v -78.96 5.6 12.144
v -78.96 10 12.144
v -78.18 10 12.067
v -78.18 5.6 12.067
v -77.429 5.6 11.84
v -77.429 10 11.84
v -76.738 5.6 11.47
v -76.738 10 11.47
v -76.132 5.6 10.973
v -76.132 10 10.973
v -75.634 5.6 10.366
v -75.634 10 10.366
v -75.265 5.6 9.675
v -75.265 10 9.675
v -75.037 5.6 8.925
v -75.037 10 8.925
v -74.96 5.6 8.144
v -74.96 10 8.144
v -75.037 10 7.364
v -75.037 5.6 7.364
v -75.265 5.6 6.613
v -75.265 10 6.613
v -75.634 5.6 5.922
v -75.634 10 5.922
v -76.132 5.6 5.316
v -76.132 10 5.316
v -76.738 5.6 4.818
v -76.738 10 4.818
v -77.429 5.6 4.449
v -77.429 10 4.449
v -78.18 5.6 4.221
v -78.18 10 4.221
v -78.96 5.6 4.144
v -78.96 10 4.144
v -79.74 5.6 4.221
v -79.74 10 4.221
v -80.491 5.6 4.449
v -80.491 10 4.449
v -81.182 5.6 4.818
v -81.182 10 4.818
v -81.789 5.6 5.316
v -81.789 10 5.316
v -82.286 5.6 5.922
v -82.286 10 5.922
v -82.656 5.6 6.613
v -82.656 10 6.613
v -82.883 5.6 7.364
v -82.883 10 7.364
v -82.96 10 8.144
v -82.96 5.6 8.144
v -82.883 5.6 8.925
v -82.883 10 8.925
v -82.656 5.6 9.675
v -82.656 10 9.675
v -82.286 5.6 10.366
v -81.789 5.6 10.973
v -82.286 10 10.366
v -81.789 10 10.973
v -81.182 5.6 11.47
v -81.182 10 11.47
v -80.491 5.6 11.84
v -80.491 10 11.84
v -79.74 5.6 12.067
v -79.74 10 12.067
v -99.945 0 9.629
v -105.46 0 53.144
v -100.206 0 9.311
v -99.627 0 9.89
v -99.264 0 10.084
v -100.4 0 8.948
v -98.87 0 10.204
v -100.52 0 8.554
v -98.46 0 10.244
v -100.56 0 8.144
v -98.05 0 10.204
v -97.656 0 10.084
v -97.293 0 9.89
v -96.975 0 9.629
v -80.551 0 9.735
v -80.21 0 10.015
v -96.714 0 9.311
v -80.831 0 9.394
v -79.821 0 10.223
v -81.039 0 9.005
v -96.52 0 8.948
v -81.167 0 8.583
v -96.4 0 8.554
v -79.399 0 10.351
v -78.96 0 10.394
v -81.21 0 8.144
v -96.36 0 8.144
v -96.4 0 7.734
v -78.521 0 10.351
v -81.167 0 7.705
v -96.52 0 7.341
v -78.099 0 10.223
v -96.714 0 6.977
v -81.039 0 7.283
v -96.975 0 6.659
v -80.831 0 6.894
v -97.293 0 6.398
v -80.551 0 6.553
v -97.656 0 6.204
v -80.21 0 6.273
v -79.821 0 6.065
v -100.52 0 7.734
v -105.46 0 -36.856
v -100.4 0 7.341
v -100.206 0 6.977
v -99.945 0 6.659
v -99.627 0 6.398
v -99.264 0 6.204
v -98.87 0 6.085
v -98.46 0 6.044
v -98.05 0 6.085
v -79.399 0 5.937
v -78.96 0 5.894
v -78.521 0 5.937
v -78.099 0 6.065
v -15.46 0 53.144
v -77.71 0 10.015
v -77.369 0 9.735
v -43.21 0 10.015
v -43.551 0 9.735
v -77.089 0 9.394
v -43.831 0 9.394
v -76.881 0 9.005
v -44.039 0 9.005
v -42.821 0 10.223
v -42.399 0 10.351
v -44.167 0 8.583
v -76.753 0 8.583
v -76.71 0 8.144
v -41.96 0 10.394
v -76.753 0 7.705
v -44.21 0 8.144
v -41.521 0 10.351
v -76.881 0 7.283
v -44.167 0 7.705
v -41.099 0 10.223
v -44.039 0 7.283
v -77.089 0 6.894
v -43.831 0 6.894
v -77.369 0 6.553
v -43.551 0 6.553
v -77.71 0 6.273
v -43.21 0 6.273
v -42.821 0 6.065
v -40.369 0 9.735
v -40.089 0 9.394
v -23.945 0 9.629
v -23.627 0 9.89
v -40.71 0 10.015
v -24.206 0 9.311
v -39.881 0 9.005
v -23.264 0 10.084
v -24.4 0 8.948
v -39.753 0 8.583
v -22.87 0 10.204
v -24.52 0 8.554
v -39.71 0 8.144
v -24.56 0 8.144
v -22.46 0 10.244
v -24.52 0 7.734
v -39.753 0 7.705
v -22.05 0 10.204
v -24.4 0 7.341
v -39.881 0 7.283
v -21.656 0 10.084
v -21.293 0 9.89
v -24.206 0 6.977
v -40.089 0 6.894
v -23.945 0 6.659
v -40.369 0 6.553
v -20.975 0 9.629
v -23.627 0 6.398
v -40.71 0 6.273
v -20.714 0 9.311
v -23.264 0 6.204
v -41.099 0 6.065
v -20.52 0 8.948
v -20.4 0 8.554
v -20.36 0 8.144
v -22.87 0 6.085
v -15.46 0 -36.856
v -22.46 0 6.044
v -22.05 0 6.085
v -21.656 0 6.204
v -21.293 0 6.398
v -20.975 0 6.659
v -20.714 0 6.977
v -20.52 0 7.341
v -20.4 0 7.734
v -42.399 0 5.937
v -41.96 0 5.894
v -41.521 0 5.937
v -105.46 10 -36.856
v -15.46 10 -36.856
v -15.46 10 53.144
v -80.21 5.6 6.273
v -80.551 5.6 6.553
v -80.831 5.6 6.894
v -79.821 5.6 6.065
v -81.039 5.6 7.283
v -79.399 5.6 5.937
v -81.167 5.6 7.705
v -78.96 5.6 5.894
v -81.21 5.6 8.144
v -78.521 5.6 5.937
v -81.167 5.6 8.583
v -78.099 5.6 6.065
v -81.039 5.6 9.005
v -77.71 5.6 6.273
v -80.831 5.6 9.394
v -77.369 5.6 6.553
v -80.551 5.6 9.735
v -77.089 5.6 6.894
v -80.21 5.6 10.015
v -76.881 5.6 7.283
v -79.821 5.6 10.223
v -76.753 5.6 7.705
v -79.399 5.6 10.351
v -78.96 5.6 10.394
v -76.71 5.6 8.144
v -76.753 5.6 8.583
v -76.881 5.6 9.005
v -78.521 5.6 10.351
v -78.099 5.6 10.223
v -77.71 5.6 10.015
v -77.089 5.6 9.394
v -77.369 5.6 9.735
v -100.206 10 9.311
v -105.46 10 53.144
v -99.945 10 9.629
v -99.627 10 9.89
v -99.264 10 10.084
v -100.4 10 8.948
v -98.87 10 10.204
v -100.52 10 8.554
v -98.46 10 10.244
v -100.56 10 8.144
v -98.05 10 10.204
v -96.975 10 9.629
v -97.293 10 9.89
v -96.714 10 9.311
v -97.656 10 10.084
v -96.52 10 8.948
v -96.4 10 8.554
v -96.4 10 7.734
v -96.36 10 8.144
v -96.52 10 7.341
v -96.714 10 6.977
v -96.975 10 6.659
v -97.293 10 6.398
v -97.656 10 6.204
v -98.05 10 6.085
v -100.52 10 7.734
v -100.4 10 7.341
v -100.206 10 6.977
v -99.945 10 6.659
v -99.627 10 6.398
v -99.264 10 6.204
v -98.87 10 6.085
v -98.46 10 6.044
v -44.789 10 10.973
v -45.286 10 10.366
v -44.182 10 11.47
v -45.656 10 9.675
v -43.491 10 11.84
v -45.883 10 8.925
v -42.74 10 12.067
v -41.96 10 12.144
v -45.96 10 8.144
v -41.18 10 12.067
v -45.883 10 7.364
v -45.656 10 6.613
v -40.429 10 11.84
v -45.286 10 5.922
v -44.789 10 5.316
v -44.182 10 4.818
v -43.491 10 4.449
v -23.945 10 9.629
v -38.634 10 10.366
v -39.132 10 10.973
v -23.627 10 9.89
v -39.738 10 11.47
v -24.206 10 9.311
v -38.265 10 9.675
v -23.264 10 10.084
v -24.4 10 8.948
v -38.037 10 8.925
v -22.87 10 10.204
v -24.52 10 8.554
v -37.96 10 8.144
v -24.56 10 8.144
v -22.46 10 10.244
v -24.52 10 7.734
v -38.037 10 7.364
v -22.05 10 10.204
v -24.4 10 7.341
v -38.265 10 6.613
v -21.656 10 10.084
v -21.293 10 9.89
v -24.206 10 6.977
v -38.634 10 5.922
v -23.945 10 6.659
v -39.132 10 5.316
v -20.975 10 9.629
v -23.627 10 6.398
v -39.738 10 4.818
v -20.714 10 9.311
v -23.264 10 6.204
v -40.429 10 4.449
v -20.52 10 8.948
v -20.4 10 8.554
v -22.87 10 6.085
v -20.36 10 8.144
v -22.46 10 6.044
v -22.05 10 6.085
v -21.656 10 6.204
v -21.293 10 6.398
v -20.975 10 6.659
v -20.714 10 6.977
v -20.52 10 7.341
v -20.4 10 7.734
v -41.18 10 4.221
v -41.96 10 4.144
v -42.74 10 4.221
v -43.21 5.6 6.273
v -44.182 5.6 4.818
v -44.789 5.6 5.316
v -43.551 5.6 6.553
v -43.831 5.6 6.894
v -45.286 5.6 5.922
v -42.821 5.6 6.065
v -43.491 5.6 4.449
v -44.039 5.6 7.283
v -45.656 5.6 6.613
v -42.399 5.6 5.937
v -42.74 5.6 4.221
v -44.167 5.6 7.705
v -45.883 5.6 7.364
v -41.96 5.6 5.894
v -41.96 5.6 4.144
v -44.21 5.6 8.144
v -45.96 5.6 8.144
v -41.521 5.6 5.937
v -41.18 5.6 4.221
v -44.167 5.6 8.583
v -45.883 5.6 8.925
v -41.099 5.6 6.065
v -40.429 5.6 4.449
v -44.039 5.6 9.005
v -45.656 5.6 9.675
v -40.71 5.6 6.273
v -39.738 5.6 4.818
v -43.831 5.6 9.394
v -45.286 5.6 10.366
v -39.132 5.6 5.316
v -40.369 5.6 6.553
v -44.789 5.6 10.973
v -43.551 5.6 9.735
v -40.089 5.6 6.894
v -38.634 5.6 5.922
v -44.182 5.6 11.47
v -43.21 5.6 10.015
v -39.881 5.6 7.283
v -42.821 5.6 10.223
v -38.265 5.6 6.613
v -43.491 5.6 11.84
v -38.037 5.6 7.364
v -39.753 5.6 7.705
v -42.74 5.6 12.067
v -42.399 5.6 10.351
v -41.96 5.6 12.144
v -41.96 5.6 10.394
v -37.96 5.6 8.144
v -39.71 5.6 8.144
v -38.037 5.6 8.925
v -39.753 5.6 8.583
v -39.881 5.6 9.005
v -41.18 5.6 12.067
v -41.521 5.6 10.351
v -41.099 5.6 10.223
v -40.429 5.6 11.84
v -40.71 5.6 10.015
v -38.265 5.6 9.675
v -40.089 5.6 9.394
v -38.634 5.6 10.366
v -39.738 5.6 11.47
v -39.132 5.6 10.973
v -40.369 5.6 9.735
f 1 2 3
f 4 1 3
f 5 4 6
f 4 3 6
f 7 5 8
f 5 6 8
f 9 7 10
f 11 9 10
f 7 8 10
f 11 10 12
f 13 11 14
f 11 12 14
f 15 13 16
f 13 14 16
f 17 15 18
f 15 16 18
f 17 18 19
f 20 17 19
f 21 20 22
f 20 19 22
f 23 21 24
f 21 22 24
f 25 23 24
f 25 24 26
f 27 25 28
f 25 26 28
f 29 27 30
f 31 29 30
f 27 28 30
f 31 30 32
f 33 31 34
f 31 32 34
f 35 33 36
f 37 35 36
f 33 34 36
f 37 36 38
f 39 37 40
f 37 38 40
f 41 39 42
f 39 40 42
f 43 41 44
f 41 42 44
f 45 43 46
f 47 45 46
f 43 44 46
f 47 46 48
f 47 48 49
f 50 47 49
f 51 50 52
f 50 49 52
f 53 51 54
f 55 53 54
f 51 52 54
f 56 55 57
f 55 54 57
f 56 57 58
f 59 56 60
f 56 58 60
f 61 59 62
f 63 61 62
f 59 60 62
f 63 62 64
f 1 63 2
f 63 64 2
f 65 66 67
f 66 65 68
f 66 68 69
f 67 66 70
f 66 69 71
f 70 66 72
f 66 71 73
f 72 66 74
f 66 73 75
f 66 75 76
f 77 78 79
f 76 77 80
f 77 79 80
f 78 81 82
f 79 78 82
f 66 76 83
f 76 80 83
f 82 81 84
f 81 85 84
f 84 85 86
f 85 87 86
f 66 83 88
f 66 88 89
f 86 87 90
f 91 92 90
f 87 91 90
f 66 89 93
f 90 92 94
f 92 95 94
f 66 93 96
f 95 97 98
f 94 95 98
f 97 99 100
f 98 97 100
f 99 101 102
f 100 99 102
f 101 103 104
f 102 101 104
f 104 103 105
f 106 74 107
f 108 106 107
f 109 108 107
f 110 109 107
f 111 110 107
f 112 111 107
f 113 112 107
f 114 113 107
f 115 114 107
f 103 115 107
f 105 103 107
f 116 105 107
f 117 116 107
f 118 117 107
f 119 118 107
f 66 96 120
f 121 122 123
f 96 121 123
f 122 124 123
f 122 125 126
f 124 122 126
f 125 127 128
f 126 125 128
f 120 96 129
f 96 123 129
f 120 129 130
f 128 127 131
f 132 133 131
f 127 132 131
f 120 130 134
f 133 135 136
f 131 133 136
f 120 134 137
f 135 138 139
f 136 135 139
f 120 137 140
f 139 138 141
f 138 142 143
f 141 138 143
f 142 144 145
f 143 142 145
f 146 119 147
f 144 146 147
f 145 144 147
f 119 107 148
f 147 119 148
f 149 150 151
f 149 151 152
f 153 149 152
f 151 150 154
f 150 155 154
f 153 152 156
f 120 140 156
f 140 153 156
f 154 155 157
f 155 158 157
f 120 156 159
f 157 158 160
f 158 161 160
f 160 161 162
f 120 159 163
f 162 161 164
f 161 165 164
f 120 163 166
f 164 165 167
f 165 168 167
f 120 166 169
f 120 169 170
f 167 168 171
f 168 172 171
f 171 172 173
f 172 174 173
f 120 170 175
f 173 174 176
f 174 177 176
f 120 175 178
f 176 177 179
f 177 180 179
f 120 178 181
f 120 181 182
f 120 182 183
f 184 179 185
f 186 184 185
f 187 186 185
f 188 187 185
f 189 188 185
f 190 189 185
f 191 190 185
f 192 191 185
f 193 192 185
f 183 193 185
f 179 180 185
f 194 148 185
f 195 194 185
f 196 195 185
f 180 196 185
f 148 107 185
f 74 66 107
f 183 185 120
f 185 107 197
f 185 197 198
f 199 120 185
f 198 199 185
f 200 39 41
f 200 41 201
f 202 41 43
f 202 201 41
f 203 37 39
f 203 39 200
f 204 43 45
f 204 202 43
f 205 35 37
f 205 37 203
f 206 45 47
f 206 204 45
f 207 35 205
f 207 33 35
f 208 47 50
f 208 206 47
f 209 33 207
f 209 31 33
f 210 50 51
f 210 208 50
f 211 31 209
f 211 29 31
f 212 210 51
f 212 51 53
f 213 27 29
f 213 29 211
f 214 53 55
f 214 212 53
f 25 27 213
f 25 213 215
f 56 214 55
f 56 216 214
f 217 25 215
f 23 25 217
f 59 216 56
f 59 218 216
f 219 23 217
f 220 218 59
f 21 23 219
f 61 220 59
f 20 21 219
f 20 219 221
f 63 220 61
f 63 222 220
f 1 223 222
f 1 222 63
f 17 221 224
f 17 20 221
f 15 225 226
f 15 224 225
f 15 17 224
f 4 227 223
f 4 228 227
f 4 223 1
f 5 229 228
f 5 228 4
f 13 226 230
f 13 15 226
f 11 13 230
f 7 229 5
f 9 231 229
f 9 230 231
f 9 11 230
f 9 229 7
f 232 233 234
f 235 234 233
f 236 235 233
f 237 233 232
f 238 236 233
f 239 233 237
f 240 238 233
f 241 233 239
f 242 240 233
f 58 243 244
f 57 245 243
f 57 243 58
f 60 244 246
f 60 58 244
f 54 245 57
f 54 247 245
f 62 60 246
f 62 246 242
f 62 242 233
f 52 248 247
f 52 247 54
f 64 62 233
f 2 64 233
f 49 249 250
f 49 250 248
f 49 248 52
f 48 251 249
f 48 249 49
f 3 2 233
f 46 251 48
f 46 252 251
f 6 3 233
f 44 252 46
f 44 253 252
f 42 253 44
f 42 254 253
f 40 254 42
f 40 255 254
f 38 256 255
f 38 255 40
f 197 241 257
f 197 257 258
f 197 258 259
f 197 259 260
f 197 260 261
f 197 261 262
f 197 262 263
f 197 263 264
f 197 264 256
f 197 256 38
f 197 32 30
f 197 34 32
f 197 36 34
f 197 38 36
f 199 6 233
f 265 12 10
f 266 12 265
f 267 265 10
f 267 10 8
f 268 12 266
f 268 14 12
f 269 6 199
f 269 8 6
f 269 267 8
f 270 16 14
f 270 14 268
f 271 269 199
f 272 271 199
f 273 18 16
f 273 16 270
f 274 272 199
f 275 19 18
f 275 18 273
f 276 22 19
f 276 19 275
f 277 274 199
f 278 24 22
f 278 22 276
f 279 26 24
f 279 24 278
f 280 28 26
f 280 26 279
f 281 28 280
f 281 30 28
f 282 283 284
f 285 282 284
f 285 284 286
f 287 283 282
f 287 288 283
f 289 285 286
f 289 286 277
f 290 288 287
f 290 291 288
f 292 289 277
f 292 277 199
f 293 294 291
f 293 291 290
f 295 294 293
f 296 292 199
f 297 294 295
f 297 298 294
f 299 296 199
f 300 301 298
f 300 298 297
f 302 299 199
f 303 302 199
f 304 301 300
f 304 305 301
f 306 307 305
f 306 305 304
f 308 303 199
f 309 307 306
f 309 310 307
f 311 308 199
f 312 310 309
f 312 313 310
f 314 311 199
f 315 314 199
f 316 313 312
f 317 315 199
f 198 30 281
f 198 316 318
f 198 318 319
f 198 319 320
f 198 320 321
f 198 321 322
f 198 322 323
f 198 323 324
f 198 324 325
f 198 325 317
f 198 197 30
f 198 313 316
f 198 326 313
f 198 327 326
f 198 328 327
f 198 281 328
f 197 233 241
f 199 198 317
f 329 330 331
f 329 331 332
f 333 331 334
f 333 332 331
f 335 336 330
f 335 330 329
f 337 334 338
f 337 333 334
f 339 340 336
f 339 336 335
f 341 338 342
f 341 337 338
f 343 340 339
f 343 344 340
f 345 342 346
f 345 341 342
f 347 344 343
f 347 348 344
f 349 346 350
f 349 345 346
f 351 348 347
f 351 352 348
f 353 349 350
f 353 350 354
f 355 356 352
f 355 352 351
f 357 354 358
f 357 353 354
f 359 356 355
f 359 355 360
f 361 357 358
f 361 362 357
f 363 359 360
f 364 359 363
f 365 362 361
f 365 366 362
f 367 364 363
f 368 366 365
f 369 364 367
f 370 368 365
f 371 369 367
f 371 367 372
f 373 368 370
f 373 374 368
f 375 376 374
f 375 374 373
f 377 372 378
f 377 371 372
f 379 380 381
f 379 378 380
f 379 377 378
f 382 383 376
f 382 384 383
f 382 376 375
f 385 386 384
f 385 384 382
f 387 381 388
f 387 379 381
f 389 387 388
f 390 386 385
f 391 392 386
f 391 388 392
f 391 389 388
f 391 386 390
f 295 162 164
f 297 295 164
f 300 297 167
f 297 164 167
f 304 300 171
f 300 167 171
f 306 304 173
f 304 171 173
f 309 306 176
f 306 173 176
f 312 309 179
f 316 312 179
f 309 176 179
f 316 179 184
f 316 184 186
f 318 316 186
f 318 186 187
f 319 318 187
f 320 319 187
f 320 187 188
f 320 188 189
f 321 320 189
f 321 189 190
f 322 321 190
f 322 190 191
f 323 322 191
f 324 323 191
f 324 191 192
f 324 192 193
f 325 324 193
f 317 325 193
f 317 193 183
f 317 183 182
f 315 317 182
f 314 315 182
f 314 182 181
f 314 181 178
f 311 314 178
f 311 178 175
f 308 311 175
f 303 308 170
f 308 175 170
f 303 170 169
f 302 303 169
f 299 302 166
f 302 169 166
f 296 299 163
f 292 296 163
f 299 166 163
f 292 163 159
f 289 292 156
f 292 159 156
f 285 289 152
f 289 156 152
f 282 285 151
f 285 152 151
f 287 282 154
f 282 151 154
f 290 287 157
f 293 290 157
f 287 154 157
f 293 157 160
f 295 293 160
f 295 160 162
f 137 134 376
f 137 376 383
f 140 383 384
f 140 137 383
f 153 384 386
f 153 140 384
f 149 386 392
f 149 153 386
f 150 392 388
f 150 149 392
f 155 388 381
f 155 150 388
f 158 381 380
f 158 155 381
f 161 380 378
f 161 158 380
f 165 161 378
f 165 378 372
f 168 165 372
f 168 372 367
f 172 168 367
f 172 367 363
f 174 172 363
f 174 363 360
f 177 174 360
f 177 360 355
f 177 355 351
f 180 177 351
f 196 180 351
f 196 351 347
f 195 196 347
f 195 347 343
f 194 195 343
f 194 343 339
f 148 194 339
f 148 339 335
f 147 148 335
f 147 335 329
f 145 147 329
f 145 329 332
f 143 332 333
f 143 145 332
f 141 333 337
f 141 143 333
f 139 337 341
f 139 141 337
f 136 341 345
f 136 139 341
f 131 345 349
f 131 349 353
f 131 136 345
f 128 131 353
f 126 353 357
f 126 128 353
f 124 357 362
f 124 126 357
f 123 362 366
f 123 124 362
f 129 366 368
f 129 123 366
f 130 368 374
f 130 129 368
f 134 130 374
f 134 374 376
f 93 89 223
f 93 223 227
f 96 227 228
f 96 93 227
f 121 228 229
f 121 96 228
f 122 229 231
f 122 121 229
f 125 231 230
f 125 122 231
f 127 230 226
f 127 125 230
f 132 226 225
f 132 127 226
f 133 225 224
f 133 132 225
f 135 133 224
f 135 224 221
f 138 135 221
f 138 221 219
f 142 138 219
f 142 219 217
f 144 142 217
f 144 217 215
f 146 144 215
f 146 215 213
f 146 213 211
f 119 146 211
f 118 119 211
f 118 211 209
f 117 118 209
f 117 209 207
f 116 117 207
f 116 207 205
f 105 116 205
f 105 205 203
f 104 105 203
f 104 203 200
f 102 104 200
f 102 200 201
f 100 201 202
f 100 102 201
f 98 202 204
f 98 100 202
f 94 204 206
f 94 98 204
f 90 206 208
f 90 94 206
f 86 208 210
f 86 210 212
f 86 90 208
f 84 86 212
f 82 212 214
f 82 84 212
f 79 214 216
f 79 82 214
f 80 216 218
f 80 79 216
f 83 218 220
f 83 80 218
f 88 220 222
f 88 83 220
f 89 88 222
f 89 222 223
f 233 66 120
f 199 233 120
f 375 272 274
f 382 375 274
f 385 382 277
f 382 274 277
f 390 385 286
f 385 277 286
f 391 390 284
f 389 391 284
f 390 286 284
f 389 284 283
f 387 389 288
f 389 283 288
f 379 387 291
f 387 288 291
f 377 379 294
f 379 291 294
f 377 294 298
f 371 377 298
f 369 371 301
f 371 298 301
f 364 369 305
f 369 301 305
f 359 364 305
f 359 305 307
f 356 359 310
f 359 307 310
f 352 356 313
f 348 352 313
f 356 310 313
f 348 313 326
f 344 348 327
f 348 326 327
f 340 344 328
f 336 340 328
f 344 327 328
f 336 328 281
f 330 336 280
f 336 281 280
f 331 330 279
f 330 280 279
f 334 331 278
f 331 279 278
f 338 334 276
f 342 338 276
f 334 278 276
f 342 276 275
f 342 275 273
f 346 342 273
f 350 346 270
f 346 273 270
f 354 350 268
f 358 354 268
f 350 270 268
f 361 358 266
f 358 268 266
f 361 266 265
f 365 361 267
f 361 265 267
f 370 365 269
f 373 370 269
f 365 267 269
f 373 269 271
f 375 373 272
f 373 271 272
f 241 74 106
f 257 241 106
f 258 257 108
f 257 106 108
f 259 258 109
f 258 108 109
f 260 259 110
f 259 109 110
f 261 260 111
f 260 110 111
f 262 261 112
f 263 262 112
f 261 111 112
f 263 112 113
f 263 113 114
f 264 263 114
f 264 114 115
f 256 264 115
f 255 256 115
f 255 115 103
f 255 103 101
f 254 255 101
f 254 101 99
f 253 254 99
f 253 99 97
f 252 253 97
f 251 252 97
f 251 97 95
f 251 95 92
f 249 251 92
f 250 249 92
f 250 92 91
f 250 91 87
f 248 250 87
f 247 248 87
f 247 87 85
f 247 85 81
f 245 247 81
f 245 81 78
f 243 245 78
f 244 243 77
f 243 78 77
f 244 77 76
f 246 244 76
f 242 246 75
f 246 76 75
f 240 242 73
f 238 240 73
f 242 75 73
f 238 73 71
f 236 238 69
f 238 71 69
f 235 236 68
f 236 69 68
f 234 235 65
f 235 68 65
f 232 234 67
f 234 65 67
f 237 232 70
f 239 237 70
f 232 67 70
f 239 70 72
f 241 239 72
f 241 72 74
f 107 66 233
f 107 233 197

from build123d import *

# Parameters (mm, degrees)
SKETCH1_W               = 90
SKETCH1_H               = 90
BOSS_EXTRUDE1_DEPTH     = 10
CUT_EXTRUDE1_DEPTH      = 95
CUT_EXTRUDE1_DEPTH_BACK = 74
SKETCH2_R               = 2.25
SKETCH2_3_R             = 4
SKETCH2_3_R_2           = 2.25
CUT_EXTRUDE2_DEPTH      = 4.4
M5_TAPPED_HOLE1_D       = 4.2


with BuildPart() as part:
    # Sketch1 → Boss-Extrude1 (new body)
    with BuildSketch(Plane(origin=(0, 0, 0), x_dir=(1, 0, 0), z_dir=(0, 1, 0))):
        with Locations((-60.460122699, -8.144171779)):
            Rectangle(SKETCH1_W, SKETCH1_H)
    extrude(amount=BOSS_EXTRUDE1_DEPTH)

    # Sketch2 → Cut-Extrude1 (cut, two sides: drawn at the far end of the back side and taken through both)
    with BuildSketch(Plane(origin=(0, 10, 0), x_dir=(1, 0, 0), z_dir=(0, 1, 0)).offset(-CUT_EXTRUDE1_DEPTH_BACK)):
        with Locations((-78.960122699, -8.144171779)):
            Circle(SKETCH2_R)
        with Locations((-41.960122699, -8.144171779)):
            Circle(SKETCH2_R)
    extrude(amount=CUT_EXTRUDE1_DEPTH + CUT_EXTRUDE1_DEPTH_BACK, mode=Mode.SUBTRACT)

    # Sketch2<3> → Cut-Extrude2 (cut)
    # profile 1 of 2: a face of its own
    with BuildSketch(Plane(origin=(0, 10, 0), x_dir=(1, 0, 0), z_dir=(0, 1, 0))):
        with Locations((-78.960122699, -8.144171779)):
            Circle(SKETCH2_3_R)
        with Locations((-78.960122699, -8.144171779)):
            Circle(SKETCH2_3_R_2, mode=Mode.SUBTRACT)
    # profile 2 of 2: a face of its own
    with BuildSketch(Plane(origin=(0, 10, 0), x_dir=(1, 0, 0), z_dir=(0, 1, 0))):
        with Locations((-41.960122699, -8.144171779)):
            Circle(SKETCH2_3_R)
        with Locations((-41.960122699, -8.144171779)):
            Circle(SKETCH2_3_R_2, mode=Mode.SUBTRACT)
    extrude(amount=-CUT_EXTRUDE2_DEPTH, mode=Mode.SUBTRACT)

    # M5 Tapped Hole1 (through all)
    with Locations(Plane(origin=(0, 10, 0), x_dir=(1, 0, 0), z_dir=(0, 1, 0))):
        with Locations((-98.460122699, -8.144171779), (-22.460122699, -8.144171779)):
            Hole(M5_TAPPED_HOLE1_D / 2)


solid = part.part
